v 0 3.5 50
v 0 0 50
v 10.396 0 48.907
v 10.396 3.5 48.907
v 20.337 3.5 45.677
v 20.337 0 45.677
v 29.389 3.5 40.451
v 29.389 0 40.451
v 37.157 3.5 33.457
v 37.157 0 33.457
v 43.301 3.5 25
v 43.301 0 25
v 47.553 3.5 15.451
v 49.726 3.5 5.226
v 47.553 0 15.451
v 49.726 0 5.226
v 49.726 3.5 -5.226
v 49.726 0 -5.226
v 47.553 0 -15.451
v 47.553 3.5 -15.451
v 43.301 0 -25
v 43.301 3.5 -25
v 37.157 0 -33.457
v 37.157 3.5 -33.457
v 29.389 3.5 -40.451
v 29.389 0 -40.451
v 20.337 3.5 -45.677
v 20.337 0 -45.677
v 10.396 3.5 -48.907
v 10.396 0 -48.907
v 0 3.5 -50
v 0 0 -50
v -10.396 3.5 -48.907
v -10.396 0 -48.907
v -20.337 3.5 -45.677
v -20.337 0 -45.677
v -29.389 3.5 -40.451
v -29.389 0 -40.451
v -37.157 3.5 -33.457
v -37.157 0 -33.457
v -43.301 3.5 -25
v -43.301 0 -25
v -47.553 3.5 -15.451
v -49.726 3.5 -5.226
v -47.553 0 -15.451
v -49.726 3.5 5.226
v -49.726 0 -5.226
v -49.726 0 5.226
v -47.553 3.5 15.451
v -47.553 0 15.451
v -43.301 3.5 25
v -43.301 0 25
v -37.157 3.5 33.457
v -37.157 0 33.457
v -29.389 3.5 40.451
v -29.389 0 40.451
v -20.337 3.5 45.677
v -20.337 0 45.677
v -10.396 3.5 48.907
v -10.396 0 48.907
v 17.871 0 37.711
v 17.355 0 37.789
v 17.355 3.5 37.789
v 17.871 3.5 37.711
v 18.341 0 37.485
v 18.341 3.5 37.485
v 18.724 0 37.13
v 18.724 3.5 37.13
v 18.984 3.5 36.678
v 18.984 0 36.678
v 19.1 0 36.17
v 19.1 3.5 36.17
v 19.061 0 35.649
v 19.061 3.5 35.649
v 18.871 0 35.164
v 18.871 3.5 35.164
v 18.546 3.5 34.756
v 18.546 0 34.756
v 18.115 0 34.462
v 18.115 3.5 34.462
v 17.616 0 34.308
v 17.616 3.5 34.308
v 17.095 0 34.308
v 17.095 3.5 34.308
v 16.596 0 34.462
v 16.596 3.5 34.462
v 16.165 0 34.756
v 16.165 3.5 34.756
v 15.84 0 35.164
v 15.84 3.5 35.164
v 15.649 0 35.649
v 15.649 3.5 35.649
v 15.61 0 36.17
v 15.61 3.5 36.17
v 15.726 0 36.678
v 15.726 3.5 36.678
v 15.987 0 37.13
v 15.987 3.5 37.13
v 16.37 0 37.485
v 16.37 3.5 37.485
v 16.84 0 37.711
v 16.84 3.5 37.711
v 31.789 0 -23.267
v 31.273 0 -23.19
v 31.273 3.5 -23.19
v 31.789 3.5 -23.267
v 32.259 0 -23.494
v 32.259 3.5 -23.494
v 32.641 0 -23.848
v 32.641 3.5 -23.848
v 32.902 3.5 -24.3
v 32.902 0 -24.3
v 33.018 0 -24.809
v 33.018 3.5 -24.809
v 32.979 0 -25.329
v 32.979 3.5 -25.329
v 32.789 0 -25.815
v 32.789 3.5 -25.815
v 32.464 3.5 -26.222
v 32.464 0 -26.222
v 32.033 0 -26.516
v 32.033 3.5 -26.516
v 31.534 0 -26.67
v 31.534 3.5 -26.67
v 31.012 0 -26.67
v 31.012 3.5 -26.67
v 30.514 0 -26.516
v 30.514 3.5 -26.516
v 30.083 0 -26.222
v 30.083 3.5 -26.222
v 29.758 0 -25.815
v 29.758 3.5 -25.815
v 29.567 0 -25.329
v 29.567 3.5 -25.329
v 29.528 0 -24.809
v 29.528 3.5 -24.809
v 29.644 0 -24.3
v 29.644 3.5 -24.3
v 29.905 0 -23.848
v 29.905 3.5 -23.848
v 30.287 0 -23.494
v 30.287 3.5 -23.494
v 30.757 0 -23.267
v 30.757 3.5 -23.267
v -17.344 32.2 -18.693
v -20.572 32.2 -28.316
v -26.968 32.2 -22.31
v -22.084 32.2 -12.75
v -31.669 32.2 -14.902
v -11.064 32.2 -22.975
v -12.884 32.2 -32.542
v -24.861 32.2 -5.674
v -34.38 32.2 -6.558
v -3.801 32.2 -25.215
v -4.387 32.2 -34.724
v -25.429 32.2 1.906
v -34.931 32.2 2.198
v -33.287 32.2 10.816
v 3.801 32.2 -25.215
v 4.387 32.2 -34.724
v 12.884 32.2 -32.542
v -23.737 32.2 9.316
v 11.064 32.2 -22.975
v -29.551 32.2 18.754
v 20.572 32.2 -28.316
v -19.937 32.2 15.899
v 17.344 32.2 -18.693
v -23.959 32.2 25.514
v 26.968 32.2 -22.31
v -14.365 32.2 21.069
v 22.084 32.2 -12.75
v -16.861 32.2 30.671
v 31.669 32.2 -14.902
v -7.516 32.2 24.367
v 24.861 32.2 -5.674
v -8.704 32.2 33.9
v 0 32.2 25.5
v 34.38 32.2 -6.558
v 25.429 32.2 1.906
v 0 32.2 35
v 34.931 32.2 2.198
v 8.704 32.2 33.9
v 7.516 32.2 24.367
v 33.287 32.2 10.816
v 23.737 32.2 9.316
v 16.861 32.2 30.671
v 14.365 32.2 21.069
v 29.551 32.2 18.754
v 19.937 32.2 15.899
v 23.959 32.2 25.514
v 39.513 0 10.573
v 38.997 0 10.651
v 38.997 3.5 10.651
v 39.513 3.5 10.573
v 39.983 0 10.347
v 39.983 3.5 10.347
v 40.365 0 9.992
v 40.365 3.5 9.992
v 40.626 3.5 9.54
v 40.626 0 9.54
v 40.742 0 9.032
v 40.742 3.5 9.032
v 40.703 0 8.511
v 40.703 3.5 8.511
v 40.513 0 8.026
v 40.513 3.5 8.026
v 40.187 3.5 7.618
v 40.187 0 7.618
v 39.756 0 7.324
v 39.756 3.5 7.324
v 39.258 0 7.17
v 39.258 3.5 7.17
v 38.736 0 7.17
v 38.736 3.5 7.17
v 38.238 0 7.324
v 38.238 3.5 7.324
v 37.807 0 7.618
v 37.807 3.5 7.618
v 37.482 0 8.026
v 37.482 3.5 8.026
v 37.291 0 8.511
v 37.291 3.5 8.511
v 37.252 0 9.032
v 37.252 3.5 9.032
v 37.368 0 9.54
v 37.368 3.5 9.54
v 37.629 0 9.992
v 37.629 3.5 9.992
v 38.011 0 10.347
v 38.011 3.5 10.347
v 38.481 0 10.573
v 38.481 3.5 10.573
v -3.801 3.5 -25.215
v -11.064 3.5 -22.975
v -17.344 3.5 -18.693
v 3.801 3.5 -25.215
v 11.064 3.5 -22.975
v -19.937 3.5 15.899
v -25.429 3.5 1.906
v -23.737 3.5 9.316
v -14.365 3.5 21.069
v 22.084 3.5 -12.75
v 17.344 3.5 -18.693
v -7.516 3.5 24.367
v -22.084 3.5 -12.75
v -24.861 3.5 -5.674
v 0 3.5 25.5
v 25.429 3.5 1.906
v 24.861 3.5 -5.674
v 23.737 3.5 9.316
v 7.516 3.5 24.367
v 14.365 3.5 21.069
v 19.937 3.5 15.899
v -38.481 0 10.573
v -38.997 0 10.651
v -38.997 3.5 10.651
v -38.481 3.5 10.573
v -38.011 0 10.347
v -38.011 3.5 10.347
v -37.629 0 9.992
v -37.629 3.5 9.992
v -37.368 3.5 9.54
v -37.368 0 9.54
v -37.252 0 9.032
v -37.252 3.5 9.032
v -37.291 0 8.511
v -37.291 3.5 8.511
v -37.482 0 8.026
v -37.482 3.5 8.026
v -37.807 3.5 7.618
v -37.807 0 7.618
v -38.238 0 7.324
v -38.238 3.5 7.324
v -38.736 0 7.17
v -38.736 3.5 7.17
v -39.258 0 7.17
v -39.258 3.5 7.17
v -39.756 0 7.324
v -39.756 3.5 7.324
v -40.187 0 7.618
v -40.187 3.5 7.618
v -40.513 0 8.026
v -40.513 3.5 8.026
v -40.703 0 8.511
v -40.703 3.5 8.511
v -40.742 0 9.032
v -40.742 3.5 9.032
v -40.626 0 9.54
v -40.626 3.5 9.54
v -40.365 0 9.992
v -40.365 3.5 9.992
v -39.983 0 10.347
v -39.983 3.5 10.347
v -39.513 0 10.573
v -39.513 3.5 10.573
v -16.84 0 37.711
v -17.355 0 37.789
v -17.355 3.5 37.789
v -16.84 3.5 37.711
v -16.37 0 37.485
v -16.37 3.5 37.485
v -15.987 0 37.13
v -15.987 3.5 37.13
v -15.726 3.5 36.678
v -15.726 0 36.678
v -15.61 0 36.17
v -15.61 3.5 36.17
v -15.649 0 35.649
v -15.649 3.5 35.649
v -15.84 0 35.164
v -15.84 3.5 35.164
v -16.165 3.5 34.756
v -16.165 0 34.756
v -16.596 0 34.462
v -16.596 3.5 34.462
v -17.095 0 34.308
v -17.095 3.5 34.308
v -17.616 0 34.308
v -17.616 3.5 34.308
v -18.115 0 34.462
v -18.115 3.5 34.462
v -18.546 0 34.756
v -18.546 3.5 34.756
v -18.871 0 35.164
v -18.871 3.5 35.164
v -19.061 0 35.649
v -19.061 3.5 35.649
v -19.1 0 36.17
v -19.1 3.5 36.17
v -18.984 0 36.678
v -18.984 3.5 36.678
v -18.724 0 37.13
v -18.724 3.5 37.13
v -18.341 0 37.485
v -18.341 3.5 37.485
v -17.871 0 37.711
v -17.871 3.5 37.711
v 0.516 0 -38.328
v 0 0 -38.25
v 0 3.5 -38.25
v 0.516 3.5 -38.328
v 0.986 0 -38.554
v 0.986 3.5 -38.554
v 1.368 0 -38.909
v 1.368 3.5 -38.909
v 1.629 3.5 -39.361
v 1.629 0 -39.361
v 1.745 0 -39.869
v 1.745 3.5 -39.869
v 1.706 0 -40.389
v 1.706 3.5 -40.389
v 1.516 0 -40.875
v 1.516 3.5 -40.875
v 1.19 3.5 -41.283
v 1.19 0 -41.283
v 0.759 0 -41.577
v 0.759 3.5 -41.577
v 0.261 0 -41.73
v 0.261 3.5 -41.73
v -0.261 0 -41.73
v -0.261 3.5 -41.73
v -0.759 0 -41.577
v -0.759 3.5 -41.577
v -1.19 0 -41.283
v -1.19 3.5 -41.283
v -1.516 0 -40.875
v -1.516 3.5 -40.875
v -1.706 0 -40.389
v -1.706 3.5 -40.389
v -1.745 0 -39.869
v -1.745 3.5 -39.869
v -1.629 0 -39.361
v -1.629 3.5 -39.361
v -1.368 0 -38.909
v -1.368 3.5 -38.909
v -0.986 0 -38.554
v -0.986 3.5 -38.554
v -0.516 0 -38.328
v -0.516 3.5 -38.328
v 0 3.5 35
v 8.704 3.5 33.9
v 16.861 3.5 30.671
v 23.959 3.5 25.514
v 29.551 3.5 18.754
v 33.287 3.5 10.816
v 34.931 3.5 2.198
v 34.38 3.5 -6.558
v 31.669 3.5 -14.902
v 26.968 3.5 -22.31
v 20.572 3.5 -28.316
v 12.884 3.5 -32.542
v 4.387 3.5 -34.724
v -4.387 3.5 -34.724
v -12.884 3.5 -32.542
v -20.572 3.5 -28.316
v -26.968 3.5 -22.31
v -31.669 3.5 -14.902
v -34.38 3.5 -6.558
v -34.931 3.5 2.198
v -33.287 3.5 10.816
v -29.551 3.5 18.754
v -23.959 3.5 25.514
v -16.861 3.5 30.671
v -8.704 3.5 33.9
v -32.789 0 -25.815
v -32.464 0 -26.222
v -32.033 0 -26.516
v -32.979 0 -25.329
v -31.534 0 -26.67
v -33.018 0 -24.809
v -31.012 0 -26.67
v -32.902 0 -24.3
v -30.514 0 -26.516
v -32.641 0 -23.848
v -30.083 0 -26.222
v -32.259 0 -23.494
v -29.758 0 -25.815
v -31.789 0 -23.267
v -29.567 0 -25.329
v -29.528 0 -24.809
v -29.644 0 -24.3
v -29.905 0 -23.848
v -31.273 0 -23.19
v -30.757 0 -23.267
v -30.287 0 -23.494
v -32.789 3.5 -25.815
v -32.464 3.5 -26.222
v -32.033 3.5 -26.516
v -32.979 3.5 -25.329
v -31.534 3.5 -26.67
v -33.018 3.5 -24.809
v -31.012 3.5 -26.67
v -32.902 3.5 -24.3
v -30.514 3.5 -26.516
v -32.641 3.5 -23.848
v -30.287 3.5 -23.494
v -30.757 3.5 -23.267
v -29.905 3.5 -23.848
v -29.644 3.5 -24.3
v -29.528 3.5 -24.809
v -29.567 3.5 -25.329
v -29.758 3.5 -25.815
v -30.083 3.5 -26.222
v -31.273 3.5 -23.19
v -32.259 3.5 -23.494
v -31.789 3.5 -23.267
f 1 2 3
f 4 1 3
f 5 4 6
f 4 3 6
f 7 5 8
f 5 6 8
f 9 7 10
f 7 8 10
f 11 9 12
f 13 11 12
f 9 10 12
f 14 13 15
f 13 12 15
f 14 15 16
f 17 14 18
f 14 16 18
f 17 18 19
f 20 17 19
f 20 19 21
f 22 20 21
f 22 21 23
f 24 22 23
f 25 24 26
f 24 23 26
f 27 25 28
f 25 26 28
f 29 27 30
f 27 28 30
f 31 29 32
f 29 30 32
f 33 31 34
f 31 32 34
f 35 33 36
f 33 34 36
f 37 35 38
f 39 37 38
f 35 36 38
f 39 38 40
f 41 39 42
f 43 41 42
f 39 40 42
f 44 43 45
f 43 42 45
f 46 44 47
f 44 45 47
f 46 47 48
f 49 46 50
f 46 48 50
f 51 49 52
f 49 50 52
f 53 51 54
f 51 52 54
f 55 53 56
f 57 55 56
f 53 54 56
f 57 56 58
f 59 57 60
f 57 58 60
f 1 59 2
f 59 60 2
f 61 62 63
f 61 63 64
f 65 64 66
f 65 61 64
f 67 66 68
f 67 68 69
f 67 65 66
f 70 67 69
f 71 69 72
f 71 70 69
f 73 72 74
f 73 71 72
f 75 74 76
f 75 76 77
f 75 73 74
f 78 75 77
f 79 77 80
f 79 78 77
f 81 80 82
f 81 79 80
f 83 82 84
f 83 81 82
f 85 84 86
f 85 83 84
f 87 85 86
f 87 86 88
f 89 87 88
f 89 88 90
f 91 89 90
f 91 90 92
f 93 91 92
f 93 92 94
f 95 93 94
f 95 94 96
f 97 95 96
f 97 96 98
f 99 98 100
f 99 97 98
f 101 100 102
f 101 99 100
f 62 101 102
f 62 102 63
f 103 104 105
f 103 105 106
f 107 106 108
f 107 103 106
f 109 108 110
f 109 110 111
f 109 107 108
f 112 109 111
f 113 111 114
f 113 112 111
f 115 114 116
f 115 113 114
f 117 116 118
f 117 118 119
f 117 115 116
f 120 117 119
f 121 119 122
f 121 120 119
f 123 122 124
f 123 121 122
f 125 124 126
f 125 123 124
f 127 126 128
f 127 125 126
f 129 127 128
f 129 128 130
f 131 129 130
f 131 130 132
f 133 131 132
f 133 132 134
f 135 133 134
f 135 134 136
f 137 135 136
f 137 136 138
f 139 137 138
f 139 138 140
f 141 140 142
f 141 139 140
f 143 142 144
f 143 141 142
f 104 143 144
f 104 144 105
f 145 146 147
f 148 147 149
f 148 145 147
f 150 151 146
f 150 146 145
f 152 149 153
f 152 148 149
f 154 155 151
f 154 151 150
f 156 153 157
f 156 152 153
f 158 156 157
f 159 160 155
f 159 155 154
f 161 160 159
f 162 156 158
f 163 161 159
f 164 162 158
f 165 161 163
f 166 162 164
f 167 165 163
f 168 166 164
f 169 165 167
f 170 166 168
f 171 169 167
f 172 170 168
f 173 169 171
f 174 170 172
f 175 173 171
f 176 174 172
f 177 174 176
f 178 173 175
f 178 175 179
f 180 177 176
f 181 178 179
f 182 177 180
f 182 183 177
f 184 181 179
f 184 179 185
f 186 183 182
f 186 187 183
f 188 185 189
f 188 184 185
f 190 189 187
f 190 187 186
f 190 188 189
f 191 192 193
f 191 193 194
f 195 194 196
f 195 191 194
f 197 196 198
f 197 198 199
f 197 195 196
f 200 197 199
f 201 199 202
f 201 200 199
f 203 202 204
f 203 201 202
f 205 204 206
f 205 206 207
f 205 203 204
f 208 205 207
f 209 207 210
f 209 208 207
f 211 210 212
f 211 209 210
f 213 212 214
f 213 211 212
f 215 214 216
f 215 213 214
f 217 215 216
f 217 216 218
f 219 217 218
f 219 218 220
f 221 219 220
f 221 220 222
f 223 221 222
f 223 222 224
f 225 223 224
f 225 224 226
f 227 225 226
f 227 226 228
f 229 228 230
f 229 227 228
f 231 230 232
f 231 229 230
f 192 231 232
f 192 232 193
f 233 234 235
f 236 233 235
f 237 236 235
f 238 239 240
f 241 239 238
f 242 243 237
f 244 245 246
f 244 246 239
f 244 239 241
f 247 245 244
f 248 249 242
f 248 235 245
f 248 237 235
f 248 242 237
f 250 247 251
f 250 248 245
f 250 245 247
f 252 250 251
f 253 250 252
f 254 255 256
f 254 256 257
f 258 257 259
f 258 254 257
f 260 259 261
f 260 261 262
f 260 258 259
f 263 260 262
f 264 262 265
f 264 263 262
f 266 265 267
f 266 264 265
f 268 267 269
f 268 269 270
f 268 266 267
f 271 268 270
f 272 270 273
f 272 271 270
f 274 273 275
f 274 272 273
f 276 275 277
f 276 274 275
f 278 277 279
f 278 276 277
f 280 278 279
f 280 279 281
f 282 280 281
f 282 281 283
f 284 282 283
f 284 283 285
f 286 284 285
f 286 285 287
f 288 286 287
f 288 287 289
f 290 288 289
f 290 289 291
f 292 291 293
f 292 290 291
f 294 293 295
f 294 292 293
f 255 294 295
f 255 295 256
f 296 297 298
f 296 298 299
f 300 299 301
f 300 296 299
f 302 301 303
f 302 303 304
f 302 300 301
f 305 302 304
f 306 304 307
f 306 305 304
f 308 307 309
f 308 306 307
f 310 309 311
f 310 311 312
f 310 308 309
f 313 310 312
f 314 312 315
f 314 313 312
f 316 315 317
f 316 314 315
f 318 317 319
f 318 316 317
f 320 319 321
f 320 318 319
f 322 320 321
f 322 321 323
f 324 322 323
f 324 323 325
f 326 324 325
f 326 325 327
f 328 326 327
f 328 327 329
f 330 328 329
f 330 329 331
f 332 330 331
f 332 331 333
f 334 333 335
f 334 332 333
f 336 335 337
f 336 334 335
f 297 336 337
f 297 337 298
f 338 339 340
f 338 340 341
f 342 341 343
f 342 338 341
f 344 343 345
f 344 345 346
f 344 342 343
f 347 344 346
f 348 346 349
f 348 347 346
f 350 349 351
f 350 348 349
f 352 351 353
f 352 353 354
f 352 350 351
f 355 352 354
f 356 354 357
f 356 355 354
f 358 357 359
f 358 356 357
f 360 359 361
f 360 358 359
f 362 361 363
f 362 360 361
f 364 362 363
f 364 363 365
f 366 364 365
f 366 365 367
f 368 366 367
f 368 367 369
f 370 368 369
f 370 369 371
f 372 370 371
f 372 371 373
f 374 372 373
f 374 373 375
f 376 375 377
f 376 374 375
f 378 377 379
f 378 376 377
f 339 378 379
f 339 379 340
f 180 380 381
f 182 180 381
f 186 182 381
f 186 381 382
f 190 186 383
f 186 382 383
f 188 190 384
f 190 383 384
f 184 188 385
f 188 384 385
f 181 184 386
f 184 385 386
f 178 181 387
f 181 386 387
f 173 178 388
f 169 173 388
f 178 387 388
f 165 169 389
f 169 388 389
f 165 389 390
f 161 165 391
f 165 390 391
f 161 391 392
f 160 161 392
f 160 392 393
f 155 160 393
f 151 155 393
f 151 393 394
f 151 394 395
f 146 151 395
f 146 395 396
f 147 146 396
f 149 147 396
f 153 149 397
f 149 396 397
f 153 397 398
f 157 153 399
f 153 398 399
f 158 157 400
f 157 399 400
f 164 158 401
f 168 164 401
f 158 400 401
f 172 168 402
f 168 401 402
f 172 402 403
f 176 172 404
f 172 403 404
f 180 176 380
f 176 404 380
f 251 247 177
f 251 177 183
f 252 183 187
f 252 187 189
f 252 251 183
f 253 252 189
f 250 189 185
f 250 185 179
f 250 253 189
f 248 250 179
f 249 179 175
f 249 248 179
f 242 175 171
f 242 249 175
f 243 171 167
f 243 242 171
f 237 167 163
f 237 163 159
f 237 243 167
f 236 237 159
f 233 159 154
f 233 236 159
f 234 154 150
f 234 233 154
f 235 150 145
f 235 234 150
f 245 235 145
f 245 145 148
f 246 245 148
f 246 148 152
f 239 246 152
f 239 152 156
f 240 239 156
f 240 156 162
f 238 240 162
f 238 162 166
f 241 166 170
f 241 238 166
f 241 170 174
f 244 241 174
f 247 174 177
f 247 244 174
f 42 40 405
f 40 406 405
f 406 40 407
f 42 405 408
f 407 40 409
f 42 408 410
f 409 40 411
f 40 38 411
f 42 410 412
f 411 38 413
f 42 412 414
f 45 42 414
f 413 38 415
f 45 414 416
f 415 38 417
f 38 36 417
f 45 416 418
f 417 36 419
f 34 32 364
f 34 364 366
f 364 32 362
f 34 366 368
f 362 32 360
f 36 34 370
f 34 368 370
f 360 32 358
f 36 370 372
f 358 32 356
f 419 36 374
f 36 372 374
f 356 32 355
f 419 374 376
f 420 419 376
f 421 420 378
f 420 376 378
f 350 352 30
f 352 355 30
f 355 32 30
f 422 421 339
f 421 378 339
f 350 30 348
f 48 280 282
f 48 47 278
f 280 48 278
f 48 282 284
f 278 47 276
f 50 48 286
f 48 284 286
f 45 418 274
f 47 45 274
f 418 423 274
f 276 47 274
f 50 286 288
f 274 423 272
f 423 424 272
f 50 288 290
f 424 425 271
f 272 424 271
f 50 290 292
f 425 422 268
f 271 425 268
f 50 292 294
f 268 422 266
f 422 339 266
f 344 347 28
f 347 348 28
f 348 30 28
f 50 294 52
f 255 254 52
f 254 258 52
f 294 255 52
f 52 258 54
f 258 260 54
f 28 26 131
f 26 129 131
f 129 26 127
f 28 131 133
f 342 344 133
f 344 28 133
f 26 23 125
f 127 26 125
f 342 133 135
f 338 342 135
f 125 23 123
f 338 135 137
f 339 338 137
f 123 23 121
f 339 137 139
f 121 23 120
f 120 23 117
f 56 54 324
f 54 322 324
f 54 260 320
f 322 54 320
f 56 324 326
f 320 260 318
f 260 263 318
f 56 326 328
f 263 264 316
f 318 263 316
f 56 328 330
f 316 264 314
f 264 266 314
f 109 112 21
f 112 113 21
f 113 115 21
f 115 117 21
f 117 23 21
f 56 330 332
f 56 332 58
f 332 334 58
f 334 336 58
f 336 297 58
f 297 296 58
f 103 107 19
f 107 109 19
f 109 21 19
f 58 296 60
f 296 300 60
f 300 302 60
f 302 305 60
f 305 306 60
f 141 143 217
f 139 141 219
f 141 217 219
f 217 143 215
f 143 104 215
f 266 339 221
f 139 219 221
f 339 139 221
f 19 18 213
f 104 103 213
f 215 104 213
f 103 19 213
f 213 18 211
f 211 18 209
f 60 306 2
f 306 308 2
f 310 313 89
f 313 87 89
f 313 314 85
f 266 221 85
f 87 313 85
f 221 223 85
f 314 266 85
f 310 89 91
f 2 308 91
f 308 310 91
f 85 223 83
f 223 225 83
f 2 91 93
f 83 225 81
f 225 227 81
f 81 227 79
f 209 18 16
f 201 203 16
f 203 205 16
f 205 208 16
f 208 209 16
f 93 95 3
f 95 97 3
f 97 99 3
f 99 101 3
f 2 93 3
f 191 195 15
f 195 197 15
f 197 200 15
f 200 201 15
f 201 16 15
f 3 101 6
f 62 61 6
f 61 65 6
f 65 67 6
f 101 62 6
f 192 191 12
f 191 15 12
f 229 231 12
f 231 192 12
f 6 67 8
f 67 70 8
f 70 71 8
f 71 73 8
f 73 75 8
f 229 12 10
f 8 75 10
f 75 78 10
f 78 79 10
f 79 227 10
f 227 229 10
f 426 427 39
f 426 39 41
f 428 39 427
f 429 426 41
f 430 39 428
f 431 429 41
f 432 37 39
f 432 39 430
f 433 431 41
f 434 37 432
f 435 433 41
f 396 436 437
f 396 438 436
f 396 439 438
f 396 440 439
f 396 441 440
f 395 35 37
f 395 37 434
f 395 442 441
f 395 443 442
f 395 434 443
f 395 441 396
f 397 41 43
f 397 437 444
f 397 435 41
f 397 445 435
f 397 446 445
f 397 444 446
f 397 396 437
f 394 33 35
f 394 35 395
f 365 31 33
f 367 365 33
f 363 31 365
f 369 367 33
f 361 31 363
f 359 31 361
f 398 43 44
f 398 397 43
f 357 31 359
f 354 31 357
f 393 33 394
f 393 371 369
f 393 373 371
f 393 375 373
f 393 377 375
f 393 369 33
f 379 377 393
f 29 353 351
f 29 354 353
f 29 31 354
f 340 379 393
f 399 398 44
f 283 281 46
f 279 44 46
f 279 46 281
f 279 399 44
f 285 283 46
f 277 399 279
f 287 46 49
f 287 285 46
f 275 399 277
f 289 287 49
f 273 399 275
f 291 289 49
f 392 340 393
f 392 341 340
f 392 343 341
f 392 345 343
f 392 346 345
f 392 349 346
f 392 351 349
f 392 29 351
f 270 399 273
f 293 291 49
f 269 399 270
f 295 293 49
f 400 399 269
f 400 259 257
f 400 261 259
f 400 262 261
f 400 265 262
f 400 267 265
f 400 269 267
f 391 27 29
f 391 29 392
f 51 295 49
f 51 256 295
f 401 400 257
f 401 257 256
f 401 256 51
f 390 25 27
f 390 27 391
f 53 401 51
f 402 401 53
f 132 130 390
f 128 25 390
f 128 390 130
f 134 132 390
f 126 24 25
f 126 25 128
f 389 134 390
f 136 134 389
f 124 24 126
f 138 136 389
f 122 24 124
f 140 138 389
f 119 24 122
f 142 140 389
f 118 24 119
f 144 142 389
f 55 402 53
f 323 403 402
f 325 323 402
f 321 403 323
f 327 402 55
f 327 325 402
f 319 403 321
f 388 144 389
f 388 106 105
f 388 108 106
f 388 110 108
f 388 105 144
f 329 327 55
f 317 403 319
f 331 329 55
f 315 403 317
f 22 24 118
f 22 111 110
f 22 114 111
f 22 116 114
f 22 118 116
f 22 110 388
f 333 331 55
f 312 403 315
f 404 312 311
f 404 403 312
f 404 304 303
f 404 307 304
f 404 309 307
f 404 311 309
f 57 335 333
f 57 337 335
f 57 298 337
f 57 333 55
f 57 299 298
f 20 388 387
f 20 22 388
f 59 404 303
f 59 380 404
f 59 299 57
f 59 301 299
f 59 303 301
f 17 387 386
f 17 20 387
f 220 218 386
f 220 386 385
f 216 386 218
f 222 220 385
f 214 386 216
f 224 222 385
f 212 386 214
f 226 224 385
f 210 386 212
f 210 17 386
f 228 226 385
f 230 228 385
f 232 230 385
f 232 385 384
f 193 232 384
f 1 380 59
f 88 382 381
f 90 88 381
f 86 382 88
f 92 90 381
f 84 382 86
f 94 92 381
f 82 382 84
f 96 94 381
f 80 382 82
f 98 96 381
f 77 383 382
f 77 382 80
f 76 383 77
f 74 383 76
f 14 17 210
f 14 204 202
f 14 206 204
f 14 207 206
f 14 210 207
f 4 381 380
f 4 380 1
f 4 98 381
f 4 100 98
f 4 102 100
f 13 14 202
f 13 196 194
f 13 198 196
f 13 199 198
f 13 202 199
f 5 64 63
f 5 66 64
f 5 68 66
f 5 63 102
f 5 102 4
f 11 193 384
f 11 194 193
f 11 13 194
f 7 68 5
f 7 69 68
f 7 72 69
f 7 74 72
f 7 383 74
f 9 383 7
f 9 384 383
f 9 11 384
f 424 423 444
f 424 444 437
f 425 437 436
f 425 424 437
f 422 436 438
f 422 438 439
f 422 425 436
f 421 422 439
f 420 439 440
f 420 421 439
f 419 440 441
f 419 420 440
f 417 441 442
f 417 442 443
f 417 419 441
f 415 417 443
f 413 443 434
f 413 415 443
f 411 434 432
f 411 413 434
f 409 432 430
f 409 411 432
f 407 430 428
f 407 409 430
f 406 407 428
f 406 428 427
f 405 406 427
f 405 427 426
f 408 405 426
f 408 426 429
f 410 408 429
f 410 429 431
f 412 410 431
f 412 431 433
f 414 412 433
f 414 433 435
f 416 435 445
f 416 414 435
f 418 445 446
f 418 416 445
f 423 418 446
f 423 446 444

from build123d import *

# Parameters (mm, degrees)
SKETCH1_R           = 50
SKETCH1_R_2         = 1.75
BOSS_EXTRUDE1_DEPTH = 3.5
SKETCH2_R           = 35
SKETCH2_R_2         = 25.5
BOSS_EXTRUDE3_DEPTH = 28.7


with BuildPart() as part:
    # Sketch1 → Boss-Extrude1 (new body)
    with BuildSketch(Plane(origin=(0, 0, 0), x_dir=(1, 0, 0), z_dir=(0, 1, 0))):
        with Locations(Location((0, 0, 0), (0, 0, 270))):
            Circle(SKETCH1_R)
        with Locations(Location((0, 40, 0), (0, 0, 270))):
            Circle(SKETCH1_R_2, mode=Mode.SUBTRACT)
        with Locations(Location((31.273259299, 24.939592074, 0), (0, 0, 270))):
            Circle(SKETCH1_R_2, mode=Mode.SUBTRACT)
        with Locations(Location((38.997116487, -8.900837358, 0), (0, 0, 270))):
            Circle(SKETCH1_R_2, mode=Mode.SUBTRACT)
        with Locations(Location((17.355349565, -36.038754716, 0), (0, 0, 270))):
            Circle(SKETCH1_R_2, mode=Mode.SUBTRACT)
        with Locations(Location((-17.355349565, -36.038754716, 0), (0, 0, 270))):
            Circle(SKETCH1_R_2, mode=Mode.SUBTRACT)
        with Locations(Location((-38.997116487, -8.900837358, 0), (0, 0, 270))):
            Circle(SKETCH1_R_2, mode=Mode.SUBTRACT)
        with Locations(Location((-31.273259299, 24.939592074, 0), (0, 0, 270))):
            Circle(SKETCH1_R_2, mode=Mode.SUBTRACT)
    extrude(amount=BOSS_EXTRUDE1_DEPTH)

    # Sketch2 → Boss-Extrude3 (add)
    with BuildSketch(Plane(origin=(0, 3.5, 0), x_dir=(1, 0, 0), z_dir=(0, 1, 0))):
        with Locations(Location((0, 0, 0), (0, 0, 270))):
            Circle(SKETCH2_R)
        with Locations(Location((0, 0, 0), (0, 0, 270))):
            Circle(SKETCH2_R_2, mode=Mode.SUBTRACT)
    extrude(amount=BOSS_EXTRUDE3_DEPTH)


solid = part.part
